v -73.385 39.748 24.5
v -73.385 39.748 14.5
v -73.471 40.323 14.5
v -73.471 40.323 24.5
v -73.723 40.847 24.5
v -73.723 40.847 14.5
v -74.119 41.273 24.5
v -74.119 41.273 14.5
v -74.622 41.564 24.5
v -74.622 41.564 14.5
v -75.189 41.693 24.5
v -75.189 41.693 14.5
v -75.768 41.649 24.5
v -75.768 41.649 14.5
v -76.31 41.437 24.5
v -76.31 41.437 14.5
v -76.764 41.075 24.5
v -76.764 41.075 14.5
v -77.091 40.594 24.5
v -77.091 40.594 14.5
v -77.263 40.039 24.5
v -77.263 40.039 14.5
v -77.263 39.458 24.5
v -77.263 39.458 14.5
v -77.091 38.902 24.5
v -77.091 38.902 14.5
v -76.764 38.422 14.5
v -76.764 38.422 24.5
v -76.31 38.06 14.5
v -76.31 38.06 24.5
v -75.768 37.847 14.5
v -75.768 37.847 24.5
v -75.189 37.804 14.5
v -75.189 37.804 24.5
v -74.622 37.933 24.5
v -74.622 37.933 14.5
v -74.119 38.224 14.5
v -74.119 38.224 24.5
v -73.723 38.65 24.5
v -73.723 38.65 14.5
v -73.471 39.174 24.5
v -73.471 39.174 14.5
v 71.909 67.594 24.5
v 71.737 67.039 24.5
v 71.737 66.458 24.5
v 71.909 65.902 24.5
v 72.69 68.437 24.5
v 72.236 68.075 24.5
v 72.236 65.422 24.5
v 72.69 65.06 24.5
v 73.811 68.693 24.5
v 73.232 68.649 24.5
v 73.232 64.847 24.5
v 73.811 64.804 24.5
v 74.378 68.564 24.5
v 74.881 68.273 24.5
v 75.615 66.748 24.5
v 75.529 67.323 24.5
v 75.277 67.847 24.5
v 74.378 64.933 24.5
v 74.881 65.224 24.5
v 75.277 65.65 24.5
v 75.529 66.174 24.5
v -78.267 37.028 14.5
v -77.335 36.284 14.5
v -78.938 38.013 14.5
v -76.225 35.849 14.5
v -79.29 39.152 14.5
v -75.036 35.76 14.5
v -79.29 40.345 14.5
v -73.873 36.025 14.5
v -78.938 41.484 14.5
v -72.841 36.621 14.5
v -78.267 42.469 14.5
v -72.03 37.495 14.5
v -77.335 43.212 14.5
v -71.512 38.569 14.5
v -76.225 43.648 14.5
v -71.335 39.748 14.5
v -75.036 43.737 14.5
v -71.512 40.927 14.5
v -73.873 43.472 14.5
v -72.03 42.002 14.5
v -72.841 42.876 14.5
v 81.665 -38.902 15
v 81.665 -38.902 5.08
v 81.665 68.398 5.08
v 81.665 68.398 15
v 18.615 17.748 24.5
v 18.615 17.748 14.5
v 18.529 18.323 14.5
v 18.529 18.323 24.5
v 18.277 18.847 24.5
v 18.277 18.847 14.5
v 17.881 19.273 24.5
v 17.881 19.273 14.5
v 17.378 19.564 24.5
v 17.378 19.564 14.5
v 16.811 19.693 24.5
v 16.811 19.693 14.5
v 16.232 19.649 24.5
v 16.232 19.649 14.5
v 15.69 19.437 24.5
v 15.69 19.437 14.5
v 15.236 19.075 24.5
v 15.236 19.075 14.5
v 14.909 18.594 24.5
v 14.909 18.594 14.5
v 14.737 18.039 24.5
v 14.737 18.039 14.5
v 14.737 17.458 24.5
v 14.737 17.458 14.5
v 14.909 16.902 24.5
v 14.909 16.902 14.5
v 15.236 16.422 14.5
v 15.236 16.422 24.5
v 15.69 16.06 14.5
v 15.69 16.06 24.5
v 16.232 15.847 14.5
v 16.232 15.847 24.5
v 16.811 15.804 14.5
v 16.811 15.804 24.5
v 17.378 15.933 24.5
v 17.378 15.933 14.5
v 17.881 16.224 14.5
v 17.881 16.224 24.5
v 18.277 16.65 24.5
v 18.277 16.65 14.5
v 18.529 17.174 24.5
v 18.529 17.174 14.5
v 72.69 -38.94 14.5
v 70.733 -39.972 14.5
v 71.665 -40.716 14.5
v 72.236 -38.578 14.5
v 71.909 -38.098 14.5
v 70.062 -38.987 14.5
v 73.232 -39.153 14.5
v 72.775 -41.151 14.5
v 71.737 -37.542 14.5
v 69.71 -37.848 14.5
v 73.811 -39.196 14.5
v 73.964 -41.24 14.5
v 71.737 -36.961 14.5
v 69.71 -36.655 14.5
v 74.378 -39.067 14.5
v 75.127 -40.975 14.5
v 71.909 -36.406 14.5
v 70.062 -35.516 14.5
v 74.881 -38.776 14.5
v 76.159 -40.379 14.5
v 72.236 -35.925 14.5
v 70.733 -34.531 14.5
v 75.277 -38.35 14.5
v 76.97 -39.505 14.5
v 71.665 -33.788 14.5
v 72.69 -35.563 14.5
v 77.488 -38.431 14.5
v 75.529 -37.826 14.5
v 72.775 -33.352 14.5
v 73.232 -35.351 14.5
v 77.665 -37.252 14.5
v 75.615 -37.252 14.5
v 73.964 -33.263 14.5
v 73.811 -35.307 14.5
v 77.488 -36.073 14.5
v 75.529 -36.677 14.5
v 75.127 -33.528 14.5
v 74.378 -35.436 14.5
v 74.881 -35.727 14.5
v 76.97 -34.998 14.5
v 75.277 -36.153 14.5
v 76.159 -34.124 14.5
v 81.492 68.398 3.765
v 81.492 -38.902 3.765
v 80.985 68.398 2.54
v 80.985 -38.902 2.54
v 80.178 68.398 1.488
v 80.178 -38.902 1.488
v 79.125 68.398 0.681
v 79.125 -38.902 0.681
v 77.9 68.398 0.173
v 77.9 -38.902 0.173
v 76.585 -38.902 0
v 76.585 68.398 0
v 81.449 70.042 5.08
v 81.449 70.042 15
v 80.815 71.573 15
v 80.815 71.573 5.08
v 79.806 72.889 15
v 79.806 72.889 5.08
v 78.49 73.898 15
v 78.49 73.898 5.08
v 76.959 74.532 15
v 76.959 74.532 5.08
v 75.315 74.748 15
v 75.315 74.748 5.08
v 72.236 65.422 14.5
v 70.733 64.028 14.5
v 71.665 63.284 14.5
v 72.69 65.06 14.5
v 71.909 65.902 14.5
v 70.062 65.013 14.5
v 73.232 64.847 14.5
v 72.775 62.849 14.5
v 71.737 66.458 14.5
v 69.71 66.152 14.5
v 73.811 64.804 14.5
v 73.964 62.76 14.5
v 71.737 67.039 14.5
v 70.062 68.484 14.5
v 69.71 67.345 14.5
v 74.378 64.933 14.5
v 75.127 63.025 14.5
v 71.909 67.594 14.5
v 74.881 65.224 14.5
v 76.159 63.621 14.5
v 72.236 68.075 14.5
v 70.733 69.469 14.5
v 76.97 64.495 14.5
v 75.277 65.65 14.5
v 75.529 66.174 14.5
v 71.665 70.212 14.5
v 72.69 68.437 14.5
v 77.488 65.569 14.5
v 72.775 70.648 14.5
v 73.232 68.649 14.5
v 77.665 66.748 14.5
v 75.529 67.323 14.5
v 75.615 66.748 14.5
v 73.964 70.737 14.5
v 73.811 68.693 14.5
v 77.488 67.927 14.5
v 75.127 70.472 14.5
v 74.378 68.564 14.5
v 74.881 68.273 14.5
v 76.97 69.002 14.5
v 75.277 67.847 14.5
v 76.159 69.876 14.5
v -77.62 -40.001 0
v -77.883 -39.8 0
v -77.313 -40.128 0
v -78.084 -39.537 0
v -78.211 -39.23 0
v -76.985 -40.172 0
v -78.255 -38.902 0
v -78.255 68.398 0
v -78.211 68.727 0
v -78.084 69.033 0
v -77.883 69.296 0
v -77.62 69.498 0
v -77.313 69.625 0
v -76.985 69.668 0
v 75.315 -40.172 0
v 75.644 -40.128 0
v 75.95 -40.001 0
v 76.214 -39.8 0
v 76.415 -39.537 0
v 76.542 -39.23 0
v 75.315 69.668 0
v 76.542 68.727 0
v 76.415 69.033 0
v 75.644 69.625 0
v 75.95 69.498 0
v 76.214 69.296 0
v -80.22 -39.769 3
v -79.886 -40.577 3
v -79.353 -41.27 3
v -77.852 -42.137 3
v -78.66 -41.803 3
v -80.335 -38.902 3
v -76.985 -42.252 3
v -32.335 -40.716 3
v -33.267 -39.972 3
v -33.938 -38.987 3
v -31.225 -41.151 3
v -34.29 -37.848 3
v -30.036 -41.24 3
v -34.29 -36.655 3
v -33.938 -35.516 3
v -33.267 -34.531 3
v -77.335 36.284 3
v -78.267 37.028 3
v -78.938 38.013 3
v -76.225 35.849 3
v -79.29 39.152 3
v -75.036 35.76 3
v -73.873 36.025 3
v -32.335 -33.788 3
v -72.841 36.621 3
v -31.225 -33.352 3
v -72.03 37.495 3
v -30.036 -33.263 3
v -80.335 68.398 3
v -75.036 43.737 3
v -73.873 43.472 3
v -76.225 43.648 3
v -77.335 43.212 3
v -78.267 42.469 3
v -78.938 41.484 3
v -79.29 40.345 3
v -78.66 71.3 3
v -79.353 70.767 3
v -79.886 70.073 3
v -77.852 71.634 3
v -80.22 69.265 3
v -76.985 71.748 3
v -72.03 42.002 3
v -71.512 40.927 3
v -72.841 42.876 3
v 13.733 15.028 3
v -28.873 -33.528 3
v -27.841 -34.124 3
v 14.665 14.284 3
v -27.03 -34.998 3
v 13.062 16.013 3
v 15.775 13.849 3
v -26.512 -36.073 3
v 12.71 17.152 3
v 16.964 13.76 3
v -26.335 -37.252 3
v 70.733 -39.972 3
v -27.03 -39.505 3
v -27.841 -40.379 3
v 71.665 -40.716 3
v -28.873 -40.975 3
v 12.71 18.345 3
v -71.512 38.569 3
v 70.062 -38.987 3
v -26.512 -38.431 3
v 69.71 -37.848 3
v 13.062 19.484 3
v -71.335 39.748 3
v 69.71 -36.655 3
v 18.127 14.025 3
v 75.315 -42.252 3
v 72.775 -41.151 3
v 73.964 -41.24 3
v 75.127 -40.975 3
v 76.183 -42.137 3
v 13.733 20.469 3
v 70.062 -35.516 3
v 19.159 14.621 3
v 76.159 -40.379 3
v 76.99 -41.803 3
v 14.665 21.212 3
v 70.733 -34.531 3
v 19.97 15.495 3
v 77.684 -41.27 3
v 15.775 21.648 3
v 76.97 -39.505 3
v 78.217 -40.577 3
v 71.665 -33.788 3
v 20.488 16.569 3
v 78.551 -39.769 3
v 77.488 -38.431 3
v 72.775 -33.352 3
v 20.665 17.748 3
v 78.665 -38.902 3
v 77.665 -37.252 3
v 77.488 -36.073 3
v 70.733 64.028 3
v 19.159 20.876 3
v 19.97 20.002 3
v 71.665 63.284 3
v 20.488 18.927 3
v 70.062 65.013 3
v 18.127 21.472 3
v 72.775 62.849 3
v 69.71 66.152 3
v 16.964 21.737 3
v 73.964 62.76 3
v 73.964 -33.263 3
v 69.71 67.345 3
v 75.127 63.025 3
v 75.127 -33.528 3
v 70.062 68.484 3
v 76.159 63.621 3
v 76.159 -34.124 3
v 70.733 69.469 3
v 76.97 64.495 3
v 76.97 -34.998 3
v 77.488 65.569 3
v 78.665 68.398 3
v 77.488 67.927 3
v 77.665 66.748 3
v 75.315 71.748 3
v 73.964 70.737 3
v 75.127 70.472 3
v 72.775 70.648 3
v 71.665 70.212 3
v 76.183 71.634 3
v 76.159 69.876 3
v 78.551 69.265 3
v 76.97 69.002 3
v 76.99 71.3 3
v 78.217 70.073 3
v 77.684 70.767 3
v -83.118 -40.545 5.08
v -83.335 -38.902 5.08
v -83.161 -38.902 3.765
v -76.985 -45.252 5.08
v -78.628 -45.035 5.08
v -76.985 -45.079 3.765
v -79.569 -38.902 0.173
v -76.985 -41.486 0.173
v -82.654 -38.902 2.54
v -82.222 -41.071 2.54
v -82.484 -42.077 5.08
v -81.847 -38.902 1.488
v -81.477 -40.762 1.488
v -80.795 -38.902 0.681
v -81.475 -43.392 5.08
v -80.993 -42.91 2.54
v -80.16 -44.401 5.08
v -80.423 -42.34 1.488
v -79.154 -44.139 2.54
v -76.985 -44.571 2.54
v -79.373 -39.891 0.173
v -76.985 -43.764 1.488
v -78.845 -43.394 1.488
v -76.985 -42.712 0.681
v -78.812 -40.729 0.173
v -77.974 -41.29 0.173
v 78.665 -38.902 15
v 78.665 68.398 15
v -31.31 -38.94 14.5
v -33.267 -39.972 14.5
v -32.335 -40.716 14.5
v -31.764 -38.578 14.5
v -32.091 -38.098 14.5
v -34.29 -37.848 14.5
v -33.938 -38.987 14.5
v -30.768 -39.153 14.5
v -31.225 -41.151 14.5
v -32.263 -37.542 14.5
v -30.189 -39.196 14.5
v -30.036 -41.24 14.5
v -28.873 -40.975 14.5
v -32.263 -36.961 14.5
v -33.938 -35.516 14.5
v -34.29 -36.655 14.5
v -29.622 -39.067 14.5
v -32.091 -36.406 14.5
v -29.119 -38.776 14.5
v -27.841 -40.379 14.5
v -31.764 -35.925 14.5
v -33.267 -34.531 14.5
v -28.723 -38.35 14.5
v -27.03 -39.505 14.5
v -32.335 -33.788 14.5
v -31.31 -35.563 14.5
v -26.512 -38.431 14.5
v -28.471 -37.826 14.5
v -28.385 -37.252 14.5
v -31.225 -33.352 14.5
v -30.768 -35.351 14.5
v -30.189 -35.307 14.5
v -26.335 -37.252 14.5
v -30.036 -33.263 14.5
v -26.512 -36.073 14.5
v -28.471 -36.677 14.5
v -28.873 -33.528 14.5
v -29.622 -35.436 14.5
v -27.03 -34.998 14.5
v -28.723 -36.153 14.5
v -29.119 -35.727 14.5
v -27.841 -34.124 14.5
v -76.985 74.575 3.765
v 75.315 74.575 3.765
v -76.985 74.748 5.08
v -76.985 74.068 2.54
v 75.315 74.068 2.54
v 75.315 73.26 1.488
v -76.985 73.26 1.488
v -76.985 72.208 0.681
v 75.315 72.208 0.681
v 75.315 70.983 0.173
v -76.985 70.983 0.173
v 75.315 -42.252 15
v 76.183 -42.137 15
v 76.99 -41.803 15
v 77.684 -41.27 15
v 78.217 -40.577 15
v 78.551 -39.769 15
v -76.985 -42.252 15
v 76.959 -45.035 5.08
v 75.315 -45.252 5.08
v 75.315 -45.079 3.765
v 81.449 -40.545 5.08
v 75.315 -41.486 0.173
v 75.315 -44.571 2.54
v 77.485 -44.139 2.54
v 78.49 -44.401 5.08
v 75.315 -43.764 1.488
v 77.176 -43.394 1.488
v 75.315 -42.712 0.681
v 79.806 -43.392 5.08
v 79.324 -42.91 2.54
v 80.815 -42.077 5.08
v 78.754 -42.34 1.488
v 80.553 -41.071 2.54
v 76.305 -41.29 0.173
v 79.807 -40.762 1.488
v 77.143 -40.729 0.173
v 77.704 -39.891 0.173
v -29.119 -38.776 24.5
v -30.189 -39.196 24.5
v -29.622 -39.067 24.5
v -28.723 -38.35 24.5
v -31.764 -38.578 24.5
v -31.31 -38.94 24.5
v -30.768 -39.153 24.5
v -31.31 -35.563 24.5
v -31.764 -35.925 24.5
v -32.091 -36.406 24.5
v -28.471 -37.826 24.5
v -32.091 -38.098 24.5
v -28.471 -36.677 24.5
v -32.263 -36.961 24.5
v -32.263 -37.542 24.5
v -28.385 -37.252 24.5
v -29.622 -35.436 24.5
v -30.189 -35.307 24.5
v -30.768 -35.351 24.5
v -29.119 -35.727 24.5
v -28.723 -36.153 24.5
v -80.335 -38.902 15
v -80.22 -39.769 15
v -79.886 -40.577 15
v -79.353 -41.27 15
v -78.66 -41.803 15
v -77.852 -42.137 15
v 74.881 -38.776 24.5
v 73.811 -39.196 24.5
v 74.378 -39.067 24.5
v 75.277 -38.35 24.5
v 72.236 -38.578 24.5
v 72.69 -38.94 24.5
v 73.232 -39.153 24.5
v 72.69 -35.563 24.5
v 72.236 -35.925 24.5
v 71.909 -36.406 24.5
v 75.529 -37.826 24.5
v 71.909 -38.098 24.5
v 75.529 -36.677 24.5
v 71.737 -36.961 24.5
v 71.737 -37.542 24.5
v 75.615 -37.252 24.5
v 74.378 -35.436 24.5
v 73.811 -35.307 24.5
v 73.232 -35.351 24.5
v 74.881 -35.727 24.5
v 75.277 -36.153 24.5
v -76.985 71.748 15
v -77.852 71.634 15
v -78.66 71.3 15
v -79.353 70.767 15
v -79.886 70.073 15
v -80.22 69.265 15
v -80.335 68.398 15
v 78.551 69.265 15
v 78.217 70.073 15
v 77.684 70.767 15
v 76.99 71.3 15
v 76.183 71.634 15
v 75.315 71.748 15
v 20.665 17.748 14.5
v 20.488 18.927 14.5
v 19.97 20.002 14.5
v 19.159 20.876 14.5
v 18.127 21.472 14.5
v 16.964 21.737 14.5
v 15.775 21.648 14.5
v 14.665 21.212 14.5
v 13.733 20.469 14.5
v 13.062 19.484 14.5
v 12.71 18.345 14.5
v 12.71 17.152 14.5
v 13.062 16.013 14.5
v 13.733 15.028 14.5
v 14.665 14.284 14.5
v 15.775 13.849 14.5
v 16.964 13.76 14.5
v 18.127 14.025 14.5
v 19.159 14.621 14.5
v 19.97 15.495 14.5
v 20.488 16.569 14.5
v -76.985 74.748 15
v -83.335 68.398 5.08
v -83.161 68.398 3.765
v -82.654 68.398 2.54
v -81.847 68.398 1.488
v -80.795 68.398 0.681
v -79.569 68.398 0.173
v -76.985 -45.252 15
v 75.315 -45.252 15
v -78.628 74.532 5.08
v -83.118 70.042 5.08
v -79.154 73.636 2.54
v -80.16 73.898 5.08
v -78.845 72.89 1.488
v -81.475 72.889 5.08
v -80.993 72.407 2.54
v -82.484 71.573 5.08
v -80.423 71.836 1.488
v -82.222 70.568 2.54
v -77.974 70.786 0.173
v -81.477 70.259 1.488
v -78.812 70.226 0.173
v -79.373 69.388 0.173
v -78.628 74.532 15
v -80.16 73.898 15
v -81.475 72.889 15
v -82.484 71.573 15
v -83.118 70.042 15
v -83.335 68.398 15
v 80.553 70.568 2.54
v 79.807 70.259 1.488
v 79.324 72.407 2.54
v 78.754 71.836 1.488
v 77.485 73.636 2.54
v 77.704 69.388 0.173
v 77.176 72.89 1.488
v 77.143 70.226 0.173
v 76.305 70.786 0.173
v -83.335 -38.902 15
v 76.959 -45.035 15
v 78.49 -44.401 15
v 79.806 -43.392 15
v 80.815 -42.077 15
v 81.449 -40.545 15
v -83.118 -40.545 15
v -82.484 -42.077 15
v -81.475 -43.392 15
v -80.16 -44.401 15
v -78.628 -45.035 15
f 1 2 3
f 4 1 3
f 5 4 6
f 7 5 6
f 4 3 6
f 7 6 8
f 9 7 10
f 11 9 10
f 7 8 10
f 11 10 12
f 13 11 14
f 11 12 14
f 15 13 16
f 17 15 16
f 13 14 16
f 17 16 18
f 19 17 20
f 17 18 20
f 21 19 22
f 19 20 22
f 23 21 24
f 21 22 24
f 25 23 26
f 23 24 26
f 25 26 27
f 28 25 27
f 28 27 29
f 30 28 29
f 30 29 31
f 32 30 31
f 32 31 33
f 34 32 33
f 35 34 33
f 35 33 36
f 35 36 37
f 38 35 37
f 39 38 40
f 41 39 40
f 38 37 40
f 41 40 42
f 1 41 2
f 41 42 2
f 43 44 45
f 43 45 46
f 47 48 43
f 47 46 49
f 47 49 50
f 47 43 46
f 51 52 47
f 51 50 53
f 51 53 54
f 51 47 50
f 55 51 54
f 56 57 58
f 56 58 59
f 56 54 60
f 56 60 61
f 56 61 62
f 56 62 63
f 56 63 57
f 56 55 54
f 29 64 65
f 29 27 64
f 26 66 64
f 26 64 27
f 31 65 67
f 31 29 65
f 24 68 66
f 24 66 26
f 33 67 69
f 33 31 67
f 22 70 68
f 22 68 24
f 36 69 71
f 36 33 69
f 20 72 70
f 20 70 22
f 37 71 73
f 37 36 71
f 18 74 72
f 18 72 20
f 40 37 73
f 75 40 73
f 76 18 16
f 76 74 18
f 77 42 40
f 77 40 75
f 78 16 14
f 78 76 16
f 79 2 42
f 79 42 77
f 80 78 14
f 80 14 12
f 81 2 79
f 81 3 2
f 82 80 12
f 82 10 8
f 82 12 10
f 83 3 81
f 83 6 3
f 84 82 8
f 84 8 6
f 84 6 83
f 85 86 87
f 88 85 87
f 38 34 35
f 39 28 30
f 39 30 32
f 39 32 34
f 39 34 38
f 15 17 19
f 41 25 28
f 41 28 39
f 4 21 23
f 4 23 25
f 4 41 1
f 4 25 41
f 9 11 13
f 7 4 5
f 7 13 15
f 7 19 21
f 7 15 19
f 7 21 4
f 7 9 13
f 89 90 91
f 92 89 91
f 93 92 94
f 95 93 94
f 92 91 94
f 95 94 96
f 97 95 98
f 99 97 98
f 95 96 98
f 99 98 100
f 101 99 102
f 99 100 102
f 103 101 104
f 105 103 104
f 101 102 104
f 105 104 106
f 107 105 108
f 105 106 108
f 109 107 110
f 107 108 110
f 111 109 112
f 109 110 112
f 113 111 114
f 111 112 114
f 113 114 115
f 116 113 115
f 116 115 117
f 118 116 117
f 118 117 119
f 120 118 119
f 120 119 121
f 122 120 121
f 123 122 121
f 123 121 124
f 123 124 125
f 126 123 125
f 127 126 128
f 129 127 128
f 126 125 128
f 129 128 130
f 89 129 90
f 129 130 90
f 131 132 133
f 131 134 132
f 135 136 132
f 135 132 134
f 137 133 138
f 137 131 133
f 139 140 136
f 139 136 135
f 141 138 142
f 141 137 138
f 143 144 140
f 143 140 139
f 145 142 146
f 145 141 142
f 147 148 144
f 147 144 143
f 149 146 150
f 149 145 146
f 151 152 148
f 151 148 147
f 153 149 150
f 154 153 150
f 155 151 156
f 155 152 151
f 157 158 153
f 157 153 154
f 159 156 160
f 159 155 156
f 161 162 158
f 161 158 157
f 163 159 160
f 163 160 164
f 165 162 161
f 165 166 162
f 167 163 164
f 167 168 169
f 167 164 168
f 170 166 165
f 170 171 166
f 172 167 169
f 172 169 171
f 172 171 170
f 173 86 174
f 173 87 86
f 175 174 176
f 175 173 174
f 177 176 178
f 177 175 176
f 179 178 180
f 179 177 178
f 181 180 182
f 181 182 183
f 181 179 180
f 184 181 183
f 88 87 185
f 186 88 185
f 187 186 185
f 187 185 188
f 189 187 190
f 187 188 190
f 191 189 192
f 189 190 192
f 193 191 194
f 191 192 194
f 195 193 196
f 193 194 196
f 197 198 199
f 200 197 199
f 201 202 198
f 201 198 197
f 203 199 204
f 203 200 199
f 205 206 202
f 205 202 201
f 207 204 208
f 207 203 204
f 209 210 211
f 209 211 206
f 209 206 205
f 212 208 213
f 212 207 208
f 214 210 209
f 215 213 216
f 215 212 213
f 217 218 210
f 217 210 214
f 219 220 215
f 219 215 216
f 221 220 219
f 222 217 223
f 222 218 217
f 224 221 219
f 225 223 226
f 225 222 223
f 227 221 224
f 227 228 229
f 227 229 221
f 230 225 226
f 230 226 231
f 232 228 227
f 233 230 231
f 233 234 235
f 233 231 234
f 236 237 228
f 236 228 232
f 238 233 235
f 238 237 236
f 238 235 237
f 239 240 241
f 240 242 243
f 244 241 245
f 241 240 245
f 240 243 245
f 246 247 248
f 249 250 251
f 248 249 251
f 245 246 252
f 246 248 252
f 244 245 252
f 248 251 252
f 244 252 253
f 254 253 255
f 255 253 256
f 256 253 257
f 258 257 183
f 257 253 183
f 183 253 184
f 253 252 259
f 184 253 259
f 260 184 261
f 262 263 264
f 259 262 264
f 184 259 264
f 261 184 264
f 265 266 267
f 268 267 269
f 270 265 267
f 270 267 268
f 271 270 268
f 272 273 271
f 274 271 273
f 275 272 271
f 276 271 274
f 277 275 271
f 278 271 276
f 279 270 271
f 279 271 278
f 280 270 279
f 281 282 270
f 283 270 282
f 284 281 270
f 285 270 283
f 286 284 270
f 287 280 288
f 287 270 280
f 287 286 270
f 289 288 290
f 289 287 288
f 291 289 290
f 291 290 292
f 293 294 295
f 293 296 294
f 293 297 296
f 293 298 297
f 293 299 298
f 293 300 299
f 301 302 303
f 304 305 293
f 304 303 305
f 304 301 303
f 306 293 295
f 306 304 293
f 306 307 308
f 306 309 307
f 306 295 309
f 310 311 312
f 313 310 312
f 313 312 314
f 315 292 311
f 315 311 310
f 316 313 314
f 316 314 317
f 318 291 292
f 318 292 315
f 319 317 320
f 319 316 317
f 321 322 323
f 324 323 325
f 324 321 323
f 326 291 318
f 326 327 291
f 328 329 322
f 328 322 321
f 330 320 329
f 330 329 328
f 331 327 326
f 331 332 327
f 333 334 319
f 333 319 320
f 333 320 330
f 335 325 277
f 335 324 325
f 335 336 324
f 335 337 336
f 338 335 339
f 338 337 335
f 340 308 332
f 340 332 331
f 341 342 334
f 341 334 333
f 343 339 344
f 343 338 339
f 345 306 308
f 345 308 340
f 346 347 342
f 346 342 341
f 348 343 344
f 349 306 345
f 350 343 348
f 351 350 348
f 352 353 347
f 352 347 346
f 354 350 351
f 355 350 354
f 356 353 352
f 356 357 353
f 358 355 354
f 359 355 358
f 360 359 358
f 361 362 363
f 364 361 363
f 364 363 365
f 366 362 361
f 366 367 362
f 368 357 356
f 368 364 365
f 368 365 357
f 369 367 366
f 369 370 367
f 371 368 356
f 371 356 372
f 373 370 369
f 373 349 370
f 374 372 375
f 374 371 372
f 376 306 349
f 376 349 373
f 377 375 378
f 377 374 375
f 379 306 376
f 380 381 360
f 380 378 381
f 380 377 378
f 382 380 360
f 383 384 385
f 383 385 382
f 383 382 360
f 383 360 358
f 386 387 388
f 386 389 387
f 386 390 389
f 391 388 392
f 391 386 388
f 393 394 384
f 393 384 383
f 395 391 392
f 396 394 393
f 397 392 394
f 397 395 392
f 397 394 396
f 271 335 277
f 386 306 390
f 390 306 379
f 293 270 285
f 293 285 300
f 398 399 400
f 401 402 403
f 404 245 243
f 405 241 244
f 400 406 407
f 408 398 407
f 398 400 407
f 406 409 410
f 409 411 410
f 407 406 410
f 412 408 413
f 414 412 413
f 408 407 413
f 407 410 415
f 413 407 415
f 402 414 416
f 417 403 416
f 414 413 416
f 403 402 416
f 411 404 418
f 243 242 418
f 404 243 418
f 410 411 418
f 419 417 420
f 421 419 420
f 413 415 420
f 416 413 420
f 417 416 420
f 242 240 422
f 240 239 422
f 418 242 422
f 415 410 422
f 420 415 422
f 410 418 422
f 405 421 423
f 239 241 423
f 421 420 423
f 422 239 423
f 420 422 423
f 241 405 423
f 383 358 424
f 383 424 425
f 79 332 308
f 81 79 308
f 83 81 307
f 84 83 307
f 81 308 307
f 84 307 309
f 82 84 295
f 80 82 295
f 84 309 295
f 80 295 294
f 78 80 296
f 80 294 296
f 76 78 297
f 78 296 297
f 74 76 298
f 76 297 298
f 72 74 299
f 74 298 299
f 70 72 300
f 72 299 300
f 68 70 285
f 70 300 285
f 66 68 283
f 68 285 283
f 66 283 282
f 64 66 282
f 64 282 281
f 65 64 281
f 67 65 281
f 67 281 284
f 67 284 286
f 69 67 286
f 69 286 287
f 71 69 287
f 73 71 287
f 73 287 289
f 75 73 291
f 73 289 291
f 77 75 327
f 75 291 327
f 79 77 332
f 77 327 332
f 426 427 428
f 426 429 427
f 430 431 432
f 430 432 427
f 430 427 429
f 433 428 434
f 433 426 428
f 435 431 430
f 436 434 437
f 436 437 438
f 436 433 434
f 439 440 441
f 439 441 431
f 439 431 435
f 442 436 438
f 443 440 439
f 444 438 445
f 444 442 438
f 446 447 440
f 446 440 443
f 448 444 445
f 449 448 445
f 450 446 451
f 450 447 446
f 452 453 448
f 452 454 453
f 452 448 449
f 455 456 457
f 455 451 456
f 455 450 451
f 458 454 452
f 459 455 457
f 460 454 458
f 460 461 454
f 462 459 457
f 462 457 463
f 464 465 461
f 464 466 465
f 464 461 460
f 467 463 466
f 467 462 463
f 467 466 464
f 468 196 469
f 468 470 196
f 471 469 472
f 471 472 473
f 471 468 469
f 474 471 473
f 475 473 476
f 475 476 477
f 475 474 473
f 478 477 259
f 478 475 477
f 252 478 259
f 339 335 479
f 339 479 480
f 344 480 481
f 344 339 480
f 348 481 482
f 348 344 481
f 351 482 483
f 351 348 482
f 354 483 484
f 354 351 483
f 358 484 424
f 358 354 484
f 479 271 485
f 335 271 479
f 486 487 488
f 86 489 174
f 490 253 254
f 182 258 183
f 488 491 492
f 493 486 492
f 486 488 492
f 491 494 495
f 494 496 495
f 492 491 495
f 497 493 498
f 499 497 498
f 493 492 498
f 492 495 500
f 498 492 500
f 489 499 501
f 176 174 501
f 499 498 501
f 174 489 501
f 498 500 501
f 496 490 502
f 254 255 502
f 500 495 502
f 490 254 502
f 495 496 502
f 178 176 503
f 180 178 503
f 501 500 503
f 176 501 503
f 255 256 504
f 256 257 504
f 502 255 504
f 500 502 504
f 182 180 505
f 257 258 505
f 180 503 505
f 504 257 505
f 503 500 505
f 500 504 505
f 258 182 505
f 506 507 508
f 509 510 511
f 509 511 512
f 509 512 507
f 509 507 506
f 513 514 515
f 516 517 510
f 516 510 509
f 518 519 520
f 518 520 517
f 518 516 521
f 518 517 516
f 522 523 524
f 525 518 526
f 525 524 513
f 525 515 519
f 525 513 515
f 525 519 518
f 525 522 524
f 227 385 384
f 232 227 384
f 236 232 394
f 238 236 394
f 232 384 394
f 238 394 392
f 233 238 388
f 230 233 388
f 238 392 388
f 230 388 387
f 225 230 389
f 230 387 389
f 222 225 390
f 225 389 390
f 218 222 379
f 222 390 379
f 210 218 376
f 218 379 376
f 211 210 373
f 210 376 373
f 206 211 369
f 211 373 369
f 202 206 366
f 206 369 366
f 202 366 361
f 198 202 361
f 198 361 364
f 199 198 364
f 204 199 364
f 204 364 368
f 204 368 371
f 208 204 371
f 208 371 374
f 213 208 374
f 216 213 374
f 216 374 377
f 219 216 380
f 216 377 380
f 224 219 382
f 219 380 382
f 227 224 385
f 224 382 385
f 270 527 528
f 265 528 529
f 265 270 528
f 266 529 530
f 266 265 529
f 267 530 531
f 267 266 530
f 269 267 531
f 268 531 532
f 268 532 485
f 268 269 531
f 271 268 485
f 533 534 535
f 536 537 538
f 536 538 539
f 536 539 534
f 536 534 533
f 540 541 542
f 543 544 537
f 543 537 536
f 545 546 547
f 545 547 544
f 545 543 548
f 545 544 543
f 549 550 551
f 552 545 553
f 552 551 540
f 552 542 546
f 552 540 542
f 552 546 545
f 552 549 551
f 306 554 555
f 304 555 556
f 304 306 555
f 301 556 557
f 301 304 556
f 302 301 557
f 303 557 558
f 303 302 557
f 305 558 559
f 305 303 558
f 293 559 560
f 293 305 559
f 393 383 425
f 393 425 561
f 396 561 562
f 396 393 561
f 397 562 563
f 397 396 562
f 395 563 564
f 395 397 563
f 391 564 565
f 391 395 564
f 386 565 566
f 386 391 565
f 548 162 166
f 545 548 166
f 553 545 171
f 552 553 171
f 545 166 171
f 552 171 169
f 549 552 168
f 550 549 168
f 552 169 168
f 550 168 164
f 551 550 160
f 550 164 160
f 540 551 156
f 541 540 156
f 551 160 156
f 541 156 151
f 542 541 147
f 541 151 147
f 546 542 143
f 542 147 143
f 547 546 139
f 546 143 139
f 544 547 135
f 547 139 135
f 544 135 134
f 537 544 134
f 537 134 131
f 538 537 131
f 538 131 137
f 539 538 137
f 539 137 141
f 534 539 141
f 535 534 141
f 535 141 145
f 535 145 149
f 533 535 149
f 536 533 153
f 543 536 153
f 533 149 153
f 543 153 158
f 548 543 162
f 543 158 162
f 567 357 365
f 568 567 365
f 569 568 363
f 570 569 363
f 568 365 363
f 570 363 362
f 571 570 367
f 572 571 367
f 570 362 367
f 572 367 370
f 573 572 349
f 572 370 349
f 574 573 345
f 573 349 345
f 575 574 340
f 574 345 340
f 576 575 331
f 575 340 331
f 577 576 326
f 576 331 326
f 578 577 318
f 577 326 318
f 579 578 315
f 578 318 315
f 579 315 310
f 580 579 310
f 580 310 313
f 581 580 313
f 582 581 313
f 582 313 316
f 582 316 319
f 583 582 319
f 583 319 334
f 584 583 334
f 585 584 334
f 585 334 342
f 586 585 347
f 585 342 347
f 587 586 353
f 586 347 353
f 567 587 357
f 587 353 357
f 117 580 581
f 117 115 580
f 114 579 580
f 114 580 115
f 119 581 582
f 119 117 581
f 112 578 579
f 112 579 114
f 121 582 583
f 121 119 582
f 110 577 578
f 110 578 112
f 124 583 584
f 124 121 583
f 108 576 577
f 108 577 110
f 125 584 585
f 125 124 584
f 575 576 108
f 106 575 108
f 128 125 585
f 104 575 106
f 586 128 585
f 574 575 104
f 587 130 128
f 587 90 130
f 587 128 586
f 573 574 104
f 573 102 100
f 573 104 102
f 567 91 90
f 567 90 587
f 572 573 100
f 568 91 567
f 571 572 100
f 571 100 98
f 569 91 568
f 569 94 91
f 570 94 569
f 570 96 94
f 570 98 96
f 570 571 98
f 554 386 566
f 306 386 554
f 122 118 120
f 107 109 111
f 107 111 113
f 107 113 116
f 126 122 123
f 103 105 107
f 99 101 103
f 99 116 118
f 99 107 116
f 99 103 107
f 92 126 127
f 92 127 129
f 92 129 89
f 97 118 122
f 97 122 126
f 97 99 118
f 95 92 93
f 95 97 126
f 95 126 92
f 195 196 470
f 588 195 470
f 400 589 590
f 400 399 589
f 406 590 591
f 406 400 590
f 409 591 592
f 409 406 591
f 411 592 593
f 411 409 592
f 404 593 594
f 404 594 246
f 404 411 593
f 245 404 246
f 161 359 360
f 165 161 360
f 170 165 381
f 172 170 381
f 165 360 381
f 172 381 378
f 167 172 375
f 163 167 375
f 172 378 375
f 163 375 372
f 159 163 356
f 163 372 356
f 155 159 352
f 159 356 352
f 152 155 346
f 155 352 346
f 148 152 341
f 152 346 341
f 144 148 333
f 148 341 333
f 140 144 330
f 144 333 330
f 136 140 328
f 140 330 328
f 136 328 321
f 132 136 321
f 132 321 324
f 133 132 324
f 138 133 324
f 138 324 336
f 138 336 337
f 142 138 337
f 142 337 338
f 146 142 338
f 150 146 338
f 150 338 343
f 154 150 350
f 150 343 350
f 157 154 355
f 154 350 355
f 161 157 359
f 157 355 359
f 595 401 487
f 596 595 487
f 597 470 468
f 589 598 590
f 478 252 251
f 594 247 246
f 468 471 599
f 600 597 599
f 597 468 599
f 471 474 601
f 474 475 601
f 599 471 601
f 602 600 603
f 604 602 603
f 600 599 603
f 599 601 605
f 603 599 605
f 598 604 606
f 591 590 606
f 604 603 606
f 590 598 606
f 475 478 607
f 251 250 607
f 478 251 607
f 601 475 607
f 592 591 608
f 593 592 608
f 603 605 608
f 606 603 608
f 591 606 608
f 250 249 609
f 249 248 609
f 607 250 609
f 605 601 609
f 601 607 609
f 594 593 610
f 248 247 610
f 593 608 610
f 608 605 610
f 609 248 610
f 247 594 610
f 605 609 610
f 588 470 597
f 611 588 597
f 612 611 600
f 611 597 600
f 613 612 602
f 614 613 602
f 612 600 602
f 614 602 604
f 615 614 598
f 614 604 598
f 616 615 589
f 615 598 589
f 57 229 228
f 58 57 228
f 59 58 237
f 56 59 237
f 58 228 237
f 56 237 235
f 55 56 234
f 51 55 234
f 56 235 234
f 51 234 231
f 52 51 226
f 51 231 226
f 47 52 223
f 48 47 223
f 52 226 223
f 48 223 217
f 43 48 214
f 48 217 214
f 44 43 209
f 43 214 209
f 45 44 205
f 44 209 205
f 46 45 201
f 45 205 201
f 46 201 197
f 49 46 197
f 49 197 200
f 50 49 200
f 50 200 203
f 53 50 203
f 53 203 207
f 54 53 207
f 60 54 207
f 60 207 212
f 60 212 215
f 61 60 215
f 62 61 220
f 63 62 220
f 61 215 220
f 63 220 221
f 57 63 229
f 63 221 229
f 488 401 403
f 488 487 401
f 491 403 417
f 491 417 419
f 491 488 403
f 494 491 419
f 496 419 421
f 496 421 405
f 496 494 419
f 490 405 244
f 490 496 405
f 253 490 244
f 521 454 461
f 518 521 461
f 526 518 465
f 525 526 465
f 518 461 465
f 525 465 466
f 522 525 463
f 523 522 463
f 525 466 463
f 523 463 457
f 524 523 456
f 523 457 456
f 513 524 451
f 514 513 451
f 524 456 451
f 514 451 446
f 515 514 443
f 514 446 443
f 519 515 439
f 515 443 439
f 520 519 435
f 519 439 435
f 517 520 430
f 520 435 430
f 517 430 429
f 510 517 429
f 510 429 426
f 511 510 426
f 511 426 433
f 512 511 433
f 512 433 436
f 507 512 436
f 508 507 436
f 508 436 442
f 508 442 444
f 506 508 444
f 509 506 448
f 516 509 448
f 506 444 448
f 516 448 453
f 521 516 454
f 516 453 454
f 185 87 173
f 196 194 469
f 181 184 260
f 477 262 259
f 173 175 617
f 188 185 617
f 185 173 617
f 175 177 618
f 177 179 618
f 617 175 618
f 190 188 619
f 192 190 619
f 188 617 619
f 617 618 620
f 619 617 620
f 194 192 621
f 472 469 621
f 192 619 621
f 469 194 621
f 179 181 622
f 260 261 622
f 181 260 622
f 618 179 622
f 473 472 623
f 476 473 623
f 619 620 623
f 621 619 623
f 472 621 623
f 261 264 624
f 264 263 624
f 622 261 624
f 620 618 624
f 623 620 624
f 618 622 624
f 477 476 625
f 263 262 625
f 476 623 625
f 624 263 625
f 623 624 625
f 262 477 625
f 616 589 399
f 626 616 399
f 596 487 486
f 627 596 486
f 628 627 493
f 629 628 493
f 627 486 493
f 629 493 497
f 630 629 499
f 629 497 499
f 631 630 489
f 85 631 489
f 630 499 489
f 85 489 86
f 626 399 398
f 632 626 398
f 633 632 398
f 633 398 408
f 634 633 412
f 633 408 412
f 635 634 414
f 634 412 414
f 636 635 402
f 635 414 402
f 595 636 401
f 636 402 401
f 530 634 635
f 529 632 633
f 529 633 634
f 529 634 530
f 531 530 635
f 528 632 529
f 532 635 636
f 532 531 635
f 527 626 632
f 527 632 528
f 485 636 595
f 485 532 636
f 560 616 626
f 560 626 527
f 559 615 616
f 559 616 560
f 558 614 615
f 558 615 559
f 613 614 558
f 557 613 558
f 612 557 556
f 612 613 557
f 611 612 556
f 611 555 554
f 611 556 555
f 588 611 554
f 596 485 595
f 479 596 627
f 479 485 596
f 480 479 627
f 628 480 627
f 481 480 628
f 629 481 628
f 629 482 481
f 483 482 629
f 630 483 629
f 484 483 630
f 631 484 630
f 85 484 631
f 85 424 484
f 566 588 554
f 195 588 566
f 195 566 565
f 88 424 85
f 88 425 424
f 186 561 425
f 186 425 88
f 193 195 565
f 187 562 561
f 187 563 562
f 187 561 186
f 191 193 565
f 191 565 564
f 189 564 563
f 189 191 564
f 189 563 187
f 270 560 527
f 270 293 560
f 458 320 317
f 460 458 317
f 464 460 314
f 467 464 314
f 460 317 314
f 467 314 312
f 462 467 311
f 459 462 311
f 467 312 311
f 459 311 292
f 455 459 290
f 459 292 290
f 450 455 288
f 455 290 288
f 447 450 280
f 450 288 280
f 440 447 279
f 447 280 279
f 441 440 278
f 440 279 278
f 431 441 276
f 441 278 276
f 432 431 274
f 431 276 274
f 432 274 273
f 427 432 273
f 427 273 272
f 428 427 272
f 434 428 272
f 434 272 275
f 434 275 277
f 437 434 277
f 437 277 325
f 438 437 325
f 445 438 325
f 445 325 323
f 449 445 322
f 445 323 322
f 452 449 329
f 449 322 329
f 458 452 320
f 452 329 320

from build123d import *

# Parameters (mm, degrees)
F1_DEPTH = 15
F2_T     = -3
F3_R     = 5.08
F4_R     = 4
F5_DEPTH = 11.5
F6_R     = 1.95
F7_DEPTH = 10


with BuildPart() as f1:
    # F0 (on Top) → F1 (new body)
    with BuildSketch(Plane.XY):
        with BuildLine():
            ThreePointArc((-83.334517, -38.901611), (-81.474645, -43.391739), (-76.984517, -45.251611))
            Line((-76.984517, -45.251611), (75.315483, -45.251611))
            ThreePointArc((75.315483, -45.251611), (79.805611, -43.391739), (81.665483, -38.901611))
            Line((81.665483, -38.901611), (81.665483, 68.398389))
            ThreePointArc((81.665483, 68.398389), (79.805611, 72.888517), (75.315483, 74.748389))
            Line((75.315483, 74.748389), (-76.984517, 74.748389))
            ThreePointArc((-76.984517, 74.748389), (-81.474645, 72.888517), (-83.334517, 68.398389))
            Line((-83.334517, 68.398389), (-83.334517, -38.901611))
        make_face()
    extrude(amount=F1_DEPTH)

    # F2
    f2_openings = [f1.faces().sort_by_distance(p)[0] for p in [
        (-0.834517, 14.748389, 15),
    ]]
    offset(amount=F2_T, openings=f2_openings)

    # F3
    f3_edges = [f1.edges().sort_by_distance(p)[0] for p in [
        (-81.474645, 72.888517, 0),
    ]]
    fillet(f3_edges, radius=F3_R)

    # F4 (on face) → F5 (join)
    with BuildSketch(Plane.XY.offset(3)):
        with Locations((73.665483, -37.251611)):
            Circle(F4_R)
        with Locations((73.665483, 66.748389)):
            Circle(F4_R)
        with Locations((16.665483, 17.748389)):
            Circle(F4_R)
        with Locations((-75.334517, 39.748389)):
            Circle(F4_R)
        with Locations((-30.334517, -37.251611)):
            Circle(F4_R)
    extrude(amount=F5_DEPTH)

    # F6 (on face) → F7 (join)
    with BuildSketch(Plane.XY.offset(14.5)):
        with Locations((73.665483, -37.251611)):
            Circle(F6_R)
        with Locations((16.665483, 17.748389)):
            Circle(F6_R)
        with Locations((73.665483, 66.748389)):
            Circle(F6_R)
        with Locations((-30.334517, -37.251611)):
            Circle(F6_R)
        with Locations((-75.334517, 39.748389)):
            Circle(F6_R)
    extrude(amount=F7_DEPTH)


solid = f1.part
